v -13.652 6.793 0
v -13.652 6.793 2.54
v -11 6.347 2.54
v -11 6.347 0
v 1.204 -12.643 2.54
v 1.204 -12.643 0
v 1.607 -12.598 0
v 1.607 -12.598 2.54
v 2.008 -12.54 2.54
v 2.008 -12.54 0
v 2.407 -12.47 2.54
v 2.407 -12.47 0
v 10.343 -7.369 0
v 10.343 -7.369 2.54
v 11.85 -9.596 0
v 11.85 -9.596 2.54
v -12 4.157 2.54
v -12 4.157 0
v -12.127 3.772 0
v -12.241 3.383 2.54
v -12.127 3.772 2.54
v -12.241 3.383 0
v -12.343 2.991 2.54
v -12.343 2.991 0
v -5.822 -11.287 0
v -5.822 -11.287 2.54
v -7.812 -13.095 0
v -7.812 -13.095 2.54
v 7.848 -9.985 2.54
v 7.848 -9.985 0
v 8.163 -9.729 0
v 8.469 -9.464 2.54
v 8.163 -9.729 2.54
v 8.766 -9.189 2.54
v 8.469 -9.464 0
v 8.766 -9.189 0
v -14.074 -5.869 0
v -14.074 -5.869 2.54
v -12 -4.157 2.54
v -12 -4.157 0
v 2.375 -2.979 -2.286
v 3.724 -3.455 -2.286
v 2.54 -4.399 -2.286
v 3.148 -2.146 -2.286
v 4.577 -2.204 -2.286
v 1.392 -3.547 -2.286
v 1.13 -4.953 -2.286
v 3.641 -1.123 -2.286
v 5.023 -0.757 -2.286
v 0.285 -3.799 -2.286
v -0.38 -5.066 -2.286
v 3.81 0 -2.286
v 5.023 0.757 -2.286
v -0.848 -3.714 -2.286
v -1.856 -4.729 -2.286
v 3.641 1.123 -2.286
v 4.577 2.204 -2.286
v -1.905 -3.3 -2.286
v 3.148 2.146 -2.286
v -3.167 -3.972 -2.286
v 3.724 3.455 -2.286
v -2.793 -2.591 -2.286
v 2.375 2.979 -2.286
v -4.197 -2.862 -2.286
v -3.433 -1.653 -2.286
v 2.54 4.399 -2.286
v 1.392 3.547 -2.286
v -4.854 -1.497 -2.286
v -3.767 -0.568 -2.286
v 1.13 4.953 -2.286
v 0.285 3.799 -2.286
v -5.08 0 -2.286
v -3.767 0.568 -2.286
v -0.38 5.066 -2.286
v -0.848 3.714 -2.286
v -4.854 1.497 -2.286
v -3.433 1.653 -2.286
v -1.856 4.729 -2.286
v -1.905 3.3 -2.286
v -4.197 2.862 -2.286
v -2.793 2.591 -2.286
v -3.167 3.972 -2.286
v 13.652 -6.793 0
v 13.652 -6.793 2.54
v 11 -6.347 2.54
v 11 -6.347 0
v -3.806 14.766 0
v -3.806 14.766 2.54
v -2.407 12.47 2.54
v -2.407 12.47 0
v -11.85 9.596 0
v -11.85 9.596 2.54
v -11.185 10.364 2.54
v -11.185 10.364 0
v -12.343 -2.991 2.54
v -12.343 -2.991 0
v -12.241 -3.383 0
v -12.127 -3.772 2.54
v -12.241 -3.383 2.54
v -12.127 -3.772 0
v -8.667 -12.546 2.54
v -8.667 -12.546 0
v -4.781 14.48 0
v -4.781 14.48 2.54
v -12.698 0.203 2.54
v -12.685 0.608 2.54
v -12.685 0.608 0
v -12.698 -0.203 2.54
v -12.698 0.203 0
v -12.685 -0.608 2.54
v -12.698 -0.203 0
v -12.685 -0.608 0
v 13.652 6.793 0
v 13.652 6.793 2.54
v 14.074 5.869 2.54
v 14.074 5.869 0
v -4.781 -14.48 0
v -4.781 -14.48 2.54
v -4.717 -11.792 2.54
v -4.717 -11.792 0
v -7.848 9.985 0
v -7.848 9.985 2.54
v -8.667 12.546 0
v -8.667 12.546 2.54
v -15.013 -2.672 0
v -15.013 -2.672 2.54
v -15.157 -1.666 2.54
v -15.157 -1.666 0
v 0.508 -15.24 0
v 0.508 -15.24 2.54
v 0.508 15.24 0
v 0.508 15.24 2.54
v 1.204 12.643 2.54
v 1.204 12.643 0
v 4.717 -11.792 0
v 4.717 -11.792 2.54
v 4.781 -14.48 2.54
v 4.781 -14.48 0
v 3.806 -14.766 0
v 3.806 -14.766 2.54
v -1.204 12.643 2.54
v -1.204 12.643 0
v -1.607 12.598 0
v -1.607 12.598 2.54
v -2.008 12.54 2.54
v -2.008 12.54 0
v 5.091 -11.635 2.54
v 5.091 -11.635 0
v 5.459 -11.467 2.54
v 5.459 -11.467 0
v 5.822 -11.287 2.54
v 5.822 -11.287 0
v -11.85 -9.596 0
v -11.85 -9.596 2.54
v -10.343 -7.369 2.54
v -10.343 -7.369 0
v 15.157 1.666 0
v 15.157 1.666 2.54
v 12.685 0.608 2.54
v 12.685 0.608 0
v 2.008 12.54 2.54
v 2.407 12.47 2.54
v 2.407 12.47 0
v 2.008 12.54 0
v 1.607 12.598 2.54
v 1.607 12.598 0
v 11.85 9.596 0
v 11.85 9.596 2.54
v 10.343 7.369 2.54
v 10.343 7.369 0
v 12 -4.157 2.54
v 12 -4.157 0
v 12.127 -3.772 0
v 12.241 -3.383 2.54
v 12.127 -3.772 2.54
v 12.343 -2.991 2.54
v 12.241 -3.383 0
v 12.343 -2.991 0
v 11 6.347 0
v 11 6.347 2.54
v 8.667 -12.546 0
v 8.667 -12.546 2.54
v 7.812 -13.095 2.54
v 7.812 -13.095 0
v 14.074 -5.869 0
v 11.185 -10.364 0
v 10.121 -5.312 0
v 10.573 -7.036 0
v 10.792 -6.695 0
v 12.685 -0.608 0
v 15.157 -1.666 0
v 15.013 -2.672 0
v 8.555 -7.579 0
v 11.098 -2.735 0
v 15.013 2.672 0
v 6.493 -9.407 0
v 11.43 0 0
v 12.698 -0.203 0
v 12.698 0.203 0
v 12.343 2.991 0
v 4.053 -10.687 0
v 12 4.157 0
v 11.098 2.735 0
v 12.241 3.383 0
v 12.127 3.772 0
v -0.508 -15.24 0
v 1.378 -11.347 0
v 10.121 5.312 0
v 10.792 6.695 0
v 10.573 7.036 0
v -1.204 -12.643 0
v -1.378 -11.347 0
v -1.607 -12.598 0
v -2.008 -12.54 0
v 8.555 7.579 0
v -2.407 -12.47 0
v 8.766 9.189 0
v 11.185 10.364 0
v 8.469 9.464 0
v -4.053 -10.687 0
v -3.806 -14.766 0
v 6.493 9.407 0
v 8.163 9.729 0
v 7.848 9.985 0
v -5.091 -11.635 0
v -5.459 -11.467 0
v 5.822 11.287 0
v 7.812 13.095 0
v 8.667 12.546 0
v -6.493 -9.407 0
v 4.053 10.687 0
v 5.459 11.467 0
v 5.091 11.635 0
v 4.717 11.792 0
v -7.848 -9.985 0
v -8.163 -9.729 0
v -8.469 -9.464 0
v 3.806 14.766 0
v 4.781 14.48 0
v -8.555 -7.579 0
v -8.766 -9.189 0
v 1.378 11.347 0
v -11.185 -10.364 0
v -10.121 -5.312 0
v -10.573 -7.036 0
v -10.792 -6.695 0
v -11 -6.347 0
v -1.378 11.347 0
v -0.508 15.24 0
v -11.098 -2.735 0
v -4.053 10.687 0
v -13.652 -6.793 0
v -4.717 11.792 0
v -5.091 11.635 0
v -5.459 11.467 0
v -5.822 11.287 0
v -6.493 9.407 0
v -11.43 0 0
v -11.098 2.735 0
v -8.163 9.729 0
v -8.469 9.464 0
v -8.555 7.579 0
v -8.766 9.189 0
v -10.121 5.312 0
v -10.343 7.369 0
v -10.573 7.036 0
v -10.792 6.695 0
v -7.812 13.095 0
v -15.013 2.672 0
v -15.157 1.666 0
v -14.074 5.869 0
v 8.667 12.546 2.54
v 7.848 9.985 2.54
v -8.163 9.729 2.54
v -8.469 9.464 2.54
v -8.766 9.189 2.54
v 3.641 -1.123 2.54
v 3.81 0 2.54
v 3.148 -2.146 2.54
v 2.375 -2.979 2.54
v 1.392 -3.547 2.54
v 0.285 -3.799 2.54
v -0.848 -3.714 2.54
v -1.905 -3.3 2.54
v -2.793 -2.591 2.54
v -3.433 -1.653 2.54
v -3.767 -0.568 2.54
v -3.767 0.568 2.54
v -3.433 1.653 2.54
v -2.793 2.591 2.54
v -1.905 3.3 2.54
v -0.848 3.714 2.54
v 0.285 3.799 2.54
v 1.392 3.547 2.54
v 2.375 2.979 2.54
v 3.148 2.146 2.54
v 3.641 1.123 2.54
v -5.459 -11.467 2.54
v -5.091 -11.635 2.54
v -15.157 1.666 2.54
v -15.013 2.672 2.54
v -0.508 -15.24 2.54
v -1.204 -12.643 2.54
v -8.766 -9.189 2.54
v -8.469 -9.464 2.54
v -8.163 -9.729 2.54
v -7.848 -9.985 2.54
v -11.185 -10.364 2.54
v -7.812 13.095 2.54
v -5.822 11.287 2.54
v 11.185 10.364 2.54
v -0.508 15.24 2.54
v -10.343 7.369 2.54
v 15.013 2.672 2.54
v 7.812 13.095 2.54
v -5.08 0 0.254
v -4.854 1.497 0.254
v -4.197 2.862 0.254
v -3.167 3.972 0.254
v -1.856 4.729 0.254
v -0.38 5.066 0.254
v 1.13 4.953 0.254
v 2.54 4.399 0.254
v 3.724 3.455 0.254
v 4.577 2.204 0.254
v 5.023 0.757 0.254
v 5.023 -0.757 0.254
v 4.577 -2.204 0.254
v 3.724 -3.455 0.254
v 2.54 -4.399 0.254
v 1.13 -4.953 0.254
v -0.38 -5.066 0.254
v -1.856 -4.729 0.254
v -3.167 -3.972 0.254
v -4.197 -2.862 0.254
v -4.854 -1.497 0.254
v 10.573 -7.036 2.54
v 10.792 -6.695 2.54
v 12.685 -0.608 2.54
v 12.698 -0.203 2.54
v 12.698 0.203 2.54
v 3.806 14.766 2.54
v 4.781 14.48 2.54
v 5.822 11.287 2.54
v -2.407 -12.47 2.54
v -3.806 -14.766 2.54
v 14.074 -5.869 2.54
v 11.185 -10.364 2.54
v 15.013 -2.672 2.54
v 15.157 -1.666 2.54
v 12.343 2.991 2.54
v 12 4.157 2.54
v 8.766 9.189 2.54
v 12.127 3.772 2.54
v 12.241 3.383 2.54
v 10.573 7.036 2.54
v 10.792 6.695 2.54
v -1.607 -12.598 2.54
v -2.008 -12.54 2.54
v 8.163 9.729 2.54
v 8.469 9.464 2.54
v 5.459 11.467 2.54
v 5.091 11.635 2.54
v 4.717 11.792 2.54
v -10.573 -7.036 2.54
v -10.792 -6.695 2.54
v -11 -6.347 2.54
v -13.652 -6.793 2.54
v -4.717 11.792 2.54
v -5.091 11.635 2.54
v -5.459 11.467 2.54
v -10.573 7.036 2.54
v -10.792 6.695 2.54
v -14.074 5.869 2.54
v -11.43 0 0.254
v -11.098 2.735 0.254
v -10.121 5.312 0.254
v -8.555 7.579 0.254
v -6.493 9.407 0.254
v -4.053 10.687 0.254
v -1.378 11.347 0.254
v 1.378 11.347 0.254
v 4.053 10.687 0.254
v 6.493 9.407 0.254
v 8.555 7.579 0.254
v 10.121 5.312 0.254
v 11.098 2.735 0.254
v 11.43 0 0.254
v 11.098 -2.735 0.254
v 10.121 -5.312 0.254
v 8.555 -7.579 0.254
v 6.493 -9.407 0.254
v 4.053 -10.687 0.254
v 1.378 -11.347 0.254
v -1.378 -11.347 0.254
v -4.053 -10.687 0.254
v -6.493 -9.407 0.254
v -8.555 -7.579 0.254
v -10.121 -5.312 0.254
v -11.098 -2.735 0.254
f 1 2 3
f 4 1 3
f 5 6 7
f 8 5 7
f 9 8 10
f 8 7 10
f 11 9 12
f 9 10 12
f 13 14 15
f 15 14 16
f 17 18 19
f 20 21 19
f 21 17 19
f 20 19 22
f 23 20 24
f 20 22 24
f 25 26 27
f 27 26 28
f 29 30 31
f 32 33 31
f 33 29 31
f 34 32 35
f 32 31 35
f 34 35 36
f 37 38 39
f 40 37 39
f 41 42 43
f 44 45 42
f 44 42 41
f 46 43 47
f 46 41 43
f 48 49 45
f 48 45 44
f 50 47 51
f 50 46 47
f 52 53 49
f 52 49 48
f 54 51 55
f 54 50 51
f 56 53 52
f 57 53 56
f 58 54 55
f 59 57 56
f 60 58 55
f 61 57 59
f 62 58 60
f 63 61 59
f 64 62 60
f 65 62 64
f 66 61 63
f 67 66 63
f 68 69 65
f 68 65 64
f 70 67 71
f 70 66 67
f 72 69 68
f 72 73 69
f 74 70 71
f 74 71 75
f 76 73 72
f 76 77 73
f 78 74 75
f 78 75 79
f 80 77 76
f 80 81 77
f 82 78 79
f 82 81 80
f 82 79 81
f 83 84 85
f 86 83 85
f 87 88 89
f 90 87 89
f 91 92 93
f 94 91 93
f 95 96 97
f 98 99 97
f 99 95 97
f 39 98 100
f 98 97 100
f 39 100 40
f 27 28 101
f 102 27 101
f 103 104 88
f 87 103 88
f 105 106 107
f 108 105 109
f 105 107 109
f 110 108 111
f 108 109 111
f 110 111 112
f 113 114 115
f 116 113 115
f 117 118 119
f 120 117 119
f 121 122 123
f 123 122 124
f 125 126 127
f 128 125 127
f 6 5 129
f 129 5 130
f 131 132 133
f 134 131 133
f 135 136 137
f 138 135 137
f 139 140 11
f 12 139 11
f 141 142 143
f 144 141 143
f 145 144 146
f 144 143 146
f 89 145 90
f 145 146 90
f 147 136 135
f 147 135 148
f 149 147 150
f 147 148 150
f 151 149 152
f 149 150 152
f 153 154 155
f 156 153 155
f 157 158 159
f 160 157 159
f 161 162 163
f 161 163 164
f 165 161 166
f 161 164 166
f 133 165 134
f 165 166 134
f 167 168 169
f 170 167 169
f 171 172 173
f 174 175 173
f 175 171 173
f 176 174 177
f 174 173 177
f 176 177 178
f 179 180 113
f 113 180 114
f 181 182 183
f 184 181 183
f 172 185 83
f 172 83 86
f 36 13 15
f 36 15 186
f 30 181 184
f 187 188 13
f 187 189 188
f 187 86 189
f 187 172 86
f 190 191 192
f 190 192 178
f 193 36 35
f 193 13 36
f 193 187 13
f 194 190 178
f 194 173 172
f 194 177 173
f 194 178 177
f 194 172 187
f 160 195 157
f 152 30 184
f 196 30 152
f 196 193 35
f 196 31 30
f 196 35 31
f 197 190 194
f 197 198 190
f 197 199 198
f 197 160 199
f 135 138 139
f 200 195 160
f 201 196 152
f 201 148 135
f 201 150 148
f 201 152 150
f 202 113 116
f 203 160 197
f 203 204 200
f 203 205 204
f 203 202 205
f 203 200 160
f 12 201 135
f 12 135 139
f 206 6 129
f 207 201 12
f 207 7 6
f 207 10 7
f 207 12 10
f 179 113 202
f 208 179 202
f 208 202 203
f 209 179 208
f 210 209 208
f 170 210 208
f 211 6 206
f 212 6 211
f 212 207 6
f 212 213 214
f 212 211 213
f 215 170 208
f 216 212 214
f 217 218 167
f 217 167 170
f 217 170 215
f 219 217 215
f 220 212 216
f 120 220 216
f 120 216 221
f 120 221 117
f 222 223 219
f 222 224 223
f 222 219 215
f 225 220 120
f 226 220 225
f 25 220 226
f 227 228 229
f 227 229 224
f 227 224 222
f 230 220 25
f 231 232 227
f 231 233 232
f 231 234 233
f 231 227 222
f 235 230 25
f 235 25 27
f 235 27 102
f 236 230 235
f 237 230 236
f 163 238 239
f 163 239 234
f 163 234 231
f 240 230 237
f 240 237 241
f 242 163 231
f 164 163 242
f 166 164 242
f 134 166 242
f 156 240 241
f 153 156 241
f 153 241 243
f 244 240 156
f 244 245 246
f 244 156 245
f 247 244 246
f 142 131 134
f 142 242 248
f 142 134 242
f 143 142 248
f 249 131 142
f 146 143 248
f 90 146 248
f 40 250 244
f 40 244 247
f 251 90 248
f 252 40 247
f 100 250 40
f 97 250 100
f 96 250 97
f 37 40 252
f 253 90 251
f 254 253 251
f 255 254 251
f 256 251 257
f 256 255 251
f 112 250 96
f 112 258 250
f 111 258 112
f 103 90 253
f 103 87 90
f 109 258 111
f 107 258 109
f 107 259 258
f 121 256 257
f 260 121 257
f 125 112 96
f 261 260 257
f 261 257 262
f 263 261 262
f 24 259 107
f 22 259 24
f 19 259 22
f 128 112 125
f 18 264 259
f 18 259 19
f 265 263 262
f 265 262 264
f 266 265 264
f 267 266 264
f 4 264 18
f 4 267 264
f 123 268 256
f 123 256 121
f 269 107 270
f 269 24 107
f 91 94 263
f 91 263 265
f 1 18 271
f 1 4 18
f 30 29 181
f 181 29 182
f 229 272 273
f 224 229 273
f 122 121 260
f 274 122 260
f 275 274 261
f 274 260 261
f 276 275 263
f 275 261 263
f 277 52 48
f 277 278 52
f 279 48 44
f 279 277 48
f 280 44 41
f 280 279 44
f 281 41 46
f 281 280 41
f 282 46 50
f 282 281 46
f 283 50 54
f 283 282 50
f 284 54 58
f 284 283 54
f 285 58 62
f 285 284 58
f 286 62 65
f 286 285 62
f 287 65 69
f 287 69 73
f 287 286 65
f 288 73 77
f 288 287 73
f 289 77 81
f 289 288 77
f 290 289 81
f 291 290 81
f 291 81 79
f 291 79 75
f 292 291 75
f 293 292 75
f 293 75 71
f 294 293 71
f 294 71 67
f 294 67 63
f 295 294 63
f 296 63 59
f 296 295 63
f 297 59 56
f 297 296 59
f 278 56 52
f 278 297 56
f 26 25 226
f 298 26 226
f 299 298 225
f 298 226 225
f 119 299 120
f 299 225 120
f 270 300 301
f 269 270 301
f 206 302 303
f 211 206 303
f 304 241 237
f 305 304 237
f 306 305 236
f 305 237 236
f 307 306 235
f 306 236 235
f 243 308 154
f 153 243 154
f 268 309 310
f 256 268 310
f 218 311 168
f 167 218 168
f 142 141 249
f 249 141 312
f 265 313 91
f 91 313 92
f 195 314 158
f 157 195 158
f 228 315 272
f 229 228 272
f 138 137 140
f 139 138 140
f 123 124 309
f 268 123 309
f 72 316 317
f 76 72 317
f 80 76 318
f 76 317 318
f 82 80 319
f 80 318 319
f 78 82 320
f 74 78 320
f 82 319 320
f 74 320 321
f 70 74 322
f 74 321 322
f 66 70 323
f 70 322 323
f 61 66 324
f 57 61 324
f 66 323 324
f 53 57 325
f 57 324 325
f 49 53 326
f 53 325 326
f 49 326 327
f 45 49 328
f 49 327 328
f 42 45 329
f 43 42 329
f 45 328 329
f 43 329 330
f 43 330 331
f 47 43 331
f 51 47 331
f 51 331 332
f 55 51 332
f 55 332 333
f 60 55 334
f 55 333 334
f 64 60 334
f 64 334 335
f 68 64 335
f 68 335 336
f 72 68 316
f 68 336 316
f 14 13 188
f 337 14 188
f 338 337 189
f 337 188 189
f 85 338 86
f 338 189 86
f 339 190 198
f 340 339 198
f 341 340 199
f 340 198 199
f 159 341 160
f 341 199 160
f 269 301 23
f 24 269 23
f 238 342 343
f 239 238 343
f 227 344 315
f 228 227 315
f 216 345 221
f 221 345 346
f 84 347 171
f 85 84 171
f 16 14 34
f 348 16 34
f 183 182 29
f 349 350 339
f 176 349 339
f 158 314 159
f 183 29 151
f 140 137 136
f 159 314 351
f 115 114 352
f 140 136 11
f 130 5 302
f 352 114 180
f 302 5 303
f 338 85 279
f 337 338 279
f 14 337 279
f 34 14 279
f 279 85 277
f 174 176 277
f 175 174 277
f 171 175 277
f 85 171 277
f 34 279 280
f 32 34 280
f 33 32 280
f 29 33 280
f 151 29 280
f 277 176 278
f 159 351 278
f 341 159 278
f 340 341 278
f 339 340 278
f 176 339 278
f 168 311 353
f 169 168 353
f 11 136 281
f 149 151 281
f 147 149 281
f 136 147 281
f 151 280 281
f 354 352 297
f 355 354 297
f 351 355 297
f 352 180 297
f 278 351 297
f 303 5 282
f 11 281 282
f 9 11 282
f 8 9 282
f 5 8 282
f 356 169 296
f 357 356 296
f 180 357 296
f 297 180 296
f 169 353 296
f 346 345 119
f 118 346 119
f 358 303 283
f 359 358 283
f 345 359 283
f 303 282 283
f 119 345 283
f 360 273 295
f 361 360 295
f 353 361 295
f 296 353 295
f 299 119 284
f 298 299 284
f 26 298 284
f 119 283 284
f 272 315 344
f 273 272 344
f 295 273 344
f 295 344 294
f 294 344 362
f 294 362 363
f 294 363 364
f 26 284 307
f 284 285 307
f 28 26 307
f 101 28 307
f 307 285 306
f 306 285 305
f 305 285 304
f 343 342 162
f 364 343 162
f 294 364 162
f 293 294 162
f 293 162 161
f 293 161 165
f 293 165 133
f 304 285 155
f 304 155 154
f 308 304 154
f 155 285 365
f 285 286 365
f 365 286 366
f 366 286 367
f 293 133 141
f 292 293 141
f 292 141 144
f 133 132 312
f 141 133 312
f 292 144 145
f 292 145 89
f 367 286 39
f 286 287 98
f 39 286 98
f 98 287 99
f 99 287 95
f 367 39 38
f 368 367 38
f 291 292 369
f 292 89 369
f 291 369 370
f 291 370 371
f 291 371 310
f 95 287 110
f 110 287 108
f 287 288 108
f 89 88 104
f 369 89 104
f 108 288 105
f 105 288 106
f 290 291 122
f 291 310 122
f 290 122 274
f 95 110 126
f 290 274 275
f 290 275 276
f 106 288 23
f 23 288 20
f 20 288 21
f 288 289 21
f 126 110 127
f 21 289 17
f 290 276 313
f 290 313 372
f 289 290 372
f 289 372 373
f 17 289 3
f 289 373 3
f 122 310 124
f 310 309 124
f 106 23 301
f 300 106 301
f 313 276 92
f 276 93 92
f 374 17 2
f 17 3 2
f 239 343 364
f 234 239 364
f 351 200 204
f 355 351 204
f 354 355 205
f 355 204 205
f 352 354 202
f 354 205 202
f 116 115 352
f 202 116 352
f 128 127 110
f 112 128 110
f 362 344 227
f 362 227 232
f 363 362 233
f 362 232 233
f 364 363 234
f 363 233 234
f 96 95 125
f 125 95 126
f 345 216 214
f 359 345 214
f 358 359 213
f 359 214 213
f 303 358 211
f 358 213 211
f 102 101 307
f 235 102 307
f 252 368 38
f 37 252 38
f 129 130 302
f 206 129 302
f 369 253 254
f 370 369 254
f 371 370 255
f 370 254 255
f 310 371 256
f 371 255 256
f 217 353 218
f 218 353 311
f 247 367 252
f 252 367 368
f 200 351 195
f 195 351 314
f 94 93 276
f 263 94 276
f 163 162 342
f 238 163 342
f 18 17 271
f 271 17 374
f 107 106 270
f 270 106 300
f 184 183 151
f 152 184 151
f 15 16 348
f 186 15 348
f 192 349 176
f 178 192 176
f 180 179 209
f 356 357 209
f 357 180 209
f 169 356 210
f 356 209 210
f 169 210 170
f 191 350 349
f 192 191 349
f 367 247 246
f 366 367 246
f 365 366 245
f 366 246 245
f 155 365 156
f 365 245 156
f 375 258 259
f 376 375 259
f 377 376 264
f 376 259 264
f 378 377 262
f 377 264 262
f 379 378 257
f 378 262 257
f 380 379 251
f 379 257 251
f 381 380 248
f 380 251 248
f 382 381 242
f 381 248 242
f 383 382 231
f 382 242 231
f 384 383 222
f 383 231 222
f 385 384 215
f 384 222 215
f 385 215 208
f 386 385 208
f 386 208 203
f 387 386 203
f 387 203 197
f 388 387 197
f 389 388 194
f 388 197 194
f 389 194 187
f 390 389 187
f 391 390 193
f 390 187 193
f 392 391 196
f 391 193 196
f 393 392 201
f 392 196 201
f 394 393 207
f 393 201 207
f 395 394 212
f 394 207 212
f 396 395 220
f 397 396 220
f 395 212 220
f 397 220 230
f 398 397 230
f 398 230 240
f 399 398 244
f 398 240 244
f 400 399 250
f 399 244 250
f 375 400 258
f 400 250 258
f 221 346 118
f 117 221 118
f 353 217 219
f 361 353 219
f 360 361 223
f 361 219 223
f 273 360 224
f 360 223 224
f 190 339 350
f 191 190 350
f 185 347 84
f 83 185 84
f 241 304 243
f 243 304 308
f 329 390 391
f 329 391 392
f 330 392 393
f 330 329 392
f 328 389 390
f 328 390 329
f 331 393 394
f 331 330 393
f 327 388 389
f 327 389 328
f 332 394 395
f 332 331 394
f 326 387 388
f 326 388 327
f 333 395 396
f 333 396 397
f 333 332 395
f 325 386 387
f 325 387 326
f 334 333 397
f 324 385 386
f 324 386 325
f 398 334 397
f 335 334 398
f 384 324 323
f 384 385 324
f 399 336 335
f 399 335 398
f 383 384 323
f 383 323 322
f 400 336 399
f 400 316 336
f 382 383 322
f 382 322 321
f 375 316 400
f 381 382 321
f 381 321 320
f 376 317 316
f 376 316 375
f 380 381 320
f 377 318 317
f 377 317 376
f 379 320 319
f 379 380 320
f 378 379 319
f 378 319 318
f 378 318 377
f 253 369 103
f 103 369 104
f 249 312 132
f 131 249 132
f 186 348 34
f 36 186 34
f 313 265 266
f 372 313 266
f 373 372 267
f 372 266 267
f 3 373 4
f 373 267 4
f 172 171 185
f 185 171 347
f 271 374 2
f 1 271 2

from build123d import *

# Parameters (mm, degrees)
SKETCH3_R            = 12.7
BOSS_EXTRUDE2_DEPTH  = 2.54
BOSS_EXTRUDE4_DEPTH  = 2.54
CIRPATTERN1_COUNT    = 22
SKETCH5_R            = 11.43
BOSS_EXTRUDE6_DEPTH  = 0.254
SKETCH6_R            = 3.81
CUT_EXTRUDE1_DEPTH   = 16.08
SKETCH8_R            = 11.43
CUT_EXTRUDE2_DEPTH   = 0.254
SKETCH9_R            = 5.08
BOSS_EXTRUDE11_DEPTH = 2.54
CUT_EXTRUDE3_START   = -2.54
SKETCH10_R           = 3.81
CUT_EXTRUDE3_DEPTH   = 2.54


with BuildPart() as part:
    # Sketch3 → Boss-Extrude2 (new body)
    with BuildSketch(Plane.XY):
        Circle(SKETCH3_R)
    boss_extrude2 = extrude(amount=BOSS_EXTRUDE2_DEPTH)

    # Sketch4 → Boss-Extrude4 (add)
    with BuildSketch(Plane.XY.offset(2.54)):
        Polygon((-0.508, 15.24), (0.508, 15.24), (1.657370651, 10.950490333), (-1.657370651, 10.950490333), align=None)
    boss_extrude4 = extrude(amount=-BOSS_EXTRUDE4_DEPTH)

    # CirPattern1: Boss-Extrude2, Boss-Extrude4 ×22 about axis
    cirpattern1_axis = Axis((0, 0, 0), (0, 0, 1))
    add([boss_extrude2.rotate(cirpattern1_axis, i * 360 / CIRPATTERN1_COUNT) for i in range(1, CIRPATTERN1_COUNT)])
    add([boss_extrude4.rotate(cirpattern1_axis, i * 360 / CIRPATTERN1_COUNT) for i in range(1, CIRPATTERN1_COUNT)])

    # Sketch5 → Boss-Extrude6 (add)
    with BuildSketch(Plane(origin=(0, 0, 0), x_dir=(-1, 0, 0), z_dir=(0, 0, -1))):
        Circle(SKETCH5_R)
    extrude(amount=-BOSS_EXTRUDE6_DEPTH)

    # Sketch6 → Cut-Extrude1 (cut)
    with BuildSketch(Plane.XY.offset(2.54)):
        Circle(SKETCH6_R)
    extrude(amount=-CUT_EXTRUDE1_DEPTH, mode=Mode.SUBTRACT)

    # Sketch8 → Cut-Extrude2 (cut)
    with BuildSketch(Plane(origin=(0, 0, 0), x_dir=(-1, 0, 0), z_dir=(0, 0, -1))):
        Circle(SKETCH8_R)
    extrude(amount=-CUT_EXTRUDE2_DEPTH, mode=Mode.SUBTRACT)

    # Sketch9 → Boss-Extrude11 (add)
    with BuildSketch(Plane(origin=(0, 0, 0.254), x_dir=(-1, 0, 0), z_dir=(0, 0, -1))):
        Circle(SKETCH9_R)
    extrude(amount=BOSS_EXTRUDE11_DEPTH)

    # Sketch10 → Cut-Extrude3 (cut)
    with BuildSketch(Plane(origin=(0, 0, -2.286), x_dir=(-1, 0, 0), z_dir=(0, 0, -1)).offset(CUT_EXTRUDE3_START)):
        with Locations(Location((0, 0, 0), (0, 0, 180))):
            Circle(SKETCH10_R)
    extrude(amount=CUT_EXTRUDE3_DEPTH, mode=Mode.SUBTRACT)


solid = part.part
